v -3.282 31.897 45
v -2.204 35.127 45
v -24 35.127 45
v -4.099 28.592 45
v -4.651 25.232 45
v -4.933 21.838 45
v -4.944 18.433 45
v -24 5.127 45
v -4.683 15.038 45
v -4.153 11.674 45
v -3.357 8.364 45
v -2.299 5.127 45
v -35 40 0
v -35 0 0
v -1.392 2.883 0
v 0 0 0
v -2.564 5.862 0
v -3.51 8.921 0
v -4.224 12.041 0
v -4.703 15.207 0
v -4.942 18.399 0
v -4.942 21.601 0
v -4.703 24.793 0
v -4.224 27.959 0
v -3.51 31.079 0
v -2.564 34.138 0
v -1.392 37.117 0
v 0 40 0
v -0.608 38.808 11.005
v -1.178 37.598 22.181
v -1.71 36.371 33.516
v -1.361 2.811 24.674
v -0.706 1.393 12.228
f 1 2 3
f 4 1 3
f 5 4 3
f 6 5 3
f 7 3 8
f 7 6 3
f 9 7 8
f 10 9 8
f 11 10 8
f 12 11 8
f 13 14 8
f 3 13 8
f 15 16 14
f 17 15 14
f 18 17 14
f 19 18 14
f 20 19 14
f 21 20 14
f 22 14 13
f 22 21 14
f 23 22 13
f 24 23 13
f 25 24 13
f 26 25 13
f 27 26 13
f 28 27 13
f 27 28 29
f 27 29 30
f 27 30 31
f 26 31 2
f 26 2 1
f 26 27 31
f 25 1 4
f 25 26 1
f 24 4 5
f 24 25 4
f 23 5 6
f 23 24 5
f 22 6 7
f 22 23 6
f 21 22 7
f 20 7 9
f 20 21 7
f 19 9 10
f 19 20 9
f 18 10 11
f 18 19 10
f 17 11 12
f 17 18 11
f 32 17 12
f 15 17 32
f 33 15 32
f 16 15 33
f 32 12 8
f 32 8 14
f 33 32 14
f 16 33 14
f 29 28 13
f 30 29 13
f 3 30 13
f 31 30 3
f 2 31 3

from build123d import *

# Parameters (mm, degrees)
F1_DEPTH = 35
F3_DEPTH = 40.001
F5_DEPTH = 45.001


with BuildPart() as f1:
    # F0 (on Right) → F1 (new body)
    with BuildSketch(Plane.YZ):
        Polygon((5.127102, 45), (0, 0), (40, 0), (35.127102, 45), align=None)
    extrude(amount=-F1_DEPTH)

    # F2 (on Front) → F3 (cut, through all)
    with BuildSketch(Plane.XZ):
        Polygon((-35, 45), (-35, 0), (-24, 45), align=None)
    extrude(amount=-F3_DEPTH, mode=Mode.SUBTRACT)

    # F4 (on Top) → F5 (cut, through all)
    with BuildSketch(Plane.XY):
        with BuildLine():
            Line((0, 0), (0, 40))
            ThreePointArc((0, 40), (-4.972394, 20), (0, 0))
        make_face()
    extrude(amount=F5_DEPTH, mode=Mode.SUBTRACT)


solid = f1.part
